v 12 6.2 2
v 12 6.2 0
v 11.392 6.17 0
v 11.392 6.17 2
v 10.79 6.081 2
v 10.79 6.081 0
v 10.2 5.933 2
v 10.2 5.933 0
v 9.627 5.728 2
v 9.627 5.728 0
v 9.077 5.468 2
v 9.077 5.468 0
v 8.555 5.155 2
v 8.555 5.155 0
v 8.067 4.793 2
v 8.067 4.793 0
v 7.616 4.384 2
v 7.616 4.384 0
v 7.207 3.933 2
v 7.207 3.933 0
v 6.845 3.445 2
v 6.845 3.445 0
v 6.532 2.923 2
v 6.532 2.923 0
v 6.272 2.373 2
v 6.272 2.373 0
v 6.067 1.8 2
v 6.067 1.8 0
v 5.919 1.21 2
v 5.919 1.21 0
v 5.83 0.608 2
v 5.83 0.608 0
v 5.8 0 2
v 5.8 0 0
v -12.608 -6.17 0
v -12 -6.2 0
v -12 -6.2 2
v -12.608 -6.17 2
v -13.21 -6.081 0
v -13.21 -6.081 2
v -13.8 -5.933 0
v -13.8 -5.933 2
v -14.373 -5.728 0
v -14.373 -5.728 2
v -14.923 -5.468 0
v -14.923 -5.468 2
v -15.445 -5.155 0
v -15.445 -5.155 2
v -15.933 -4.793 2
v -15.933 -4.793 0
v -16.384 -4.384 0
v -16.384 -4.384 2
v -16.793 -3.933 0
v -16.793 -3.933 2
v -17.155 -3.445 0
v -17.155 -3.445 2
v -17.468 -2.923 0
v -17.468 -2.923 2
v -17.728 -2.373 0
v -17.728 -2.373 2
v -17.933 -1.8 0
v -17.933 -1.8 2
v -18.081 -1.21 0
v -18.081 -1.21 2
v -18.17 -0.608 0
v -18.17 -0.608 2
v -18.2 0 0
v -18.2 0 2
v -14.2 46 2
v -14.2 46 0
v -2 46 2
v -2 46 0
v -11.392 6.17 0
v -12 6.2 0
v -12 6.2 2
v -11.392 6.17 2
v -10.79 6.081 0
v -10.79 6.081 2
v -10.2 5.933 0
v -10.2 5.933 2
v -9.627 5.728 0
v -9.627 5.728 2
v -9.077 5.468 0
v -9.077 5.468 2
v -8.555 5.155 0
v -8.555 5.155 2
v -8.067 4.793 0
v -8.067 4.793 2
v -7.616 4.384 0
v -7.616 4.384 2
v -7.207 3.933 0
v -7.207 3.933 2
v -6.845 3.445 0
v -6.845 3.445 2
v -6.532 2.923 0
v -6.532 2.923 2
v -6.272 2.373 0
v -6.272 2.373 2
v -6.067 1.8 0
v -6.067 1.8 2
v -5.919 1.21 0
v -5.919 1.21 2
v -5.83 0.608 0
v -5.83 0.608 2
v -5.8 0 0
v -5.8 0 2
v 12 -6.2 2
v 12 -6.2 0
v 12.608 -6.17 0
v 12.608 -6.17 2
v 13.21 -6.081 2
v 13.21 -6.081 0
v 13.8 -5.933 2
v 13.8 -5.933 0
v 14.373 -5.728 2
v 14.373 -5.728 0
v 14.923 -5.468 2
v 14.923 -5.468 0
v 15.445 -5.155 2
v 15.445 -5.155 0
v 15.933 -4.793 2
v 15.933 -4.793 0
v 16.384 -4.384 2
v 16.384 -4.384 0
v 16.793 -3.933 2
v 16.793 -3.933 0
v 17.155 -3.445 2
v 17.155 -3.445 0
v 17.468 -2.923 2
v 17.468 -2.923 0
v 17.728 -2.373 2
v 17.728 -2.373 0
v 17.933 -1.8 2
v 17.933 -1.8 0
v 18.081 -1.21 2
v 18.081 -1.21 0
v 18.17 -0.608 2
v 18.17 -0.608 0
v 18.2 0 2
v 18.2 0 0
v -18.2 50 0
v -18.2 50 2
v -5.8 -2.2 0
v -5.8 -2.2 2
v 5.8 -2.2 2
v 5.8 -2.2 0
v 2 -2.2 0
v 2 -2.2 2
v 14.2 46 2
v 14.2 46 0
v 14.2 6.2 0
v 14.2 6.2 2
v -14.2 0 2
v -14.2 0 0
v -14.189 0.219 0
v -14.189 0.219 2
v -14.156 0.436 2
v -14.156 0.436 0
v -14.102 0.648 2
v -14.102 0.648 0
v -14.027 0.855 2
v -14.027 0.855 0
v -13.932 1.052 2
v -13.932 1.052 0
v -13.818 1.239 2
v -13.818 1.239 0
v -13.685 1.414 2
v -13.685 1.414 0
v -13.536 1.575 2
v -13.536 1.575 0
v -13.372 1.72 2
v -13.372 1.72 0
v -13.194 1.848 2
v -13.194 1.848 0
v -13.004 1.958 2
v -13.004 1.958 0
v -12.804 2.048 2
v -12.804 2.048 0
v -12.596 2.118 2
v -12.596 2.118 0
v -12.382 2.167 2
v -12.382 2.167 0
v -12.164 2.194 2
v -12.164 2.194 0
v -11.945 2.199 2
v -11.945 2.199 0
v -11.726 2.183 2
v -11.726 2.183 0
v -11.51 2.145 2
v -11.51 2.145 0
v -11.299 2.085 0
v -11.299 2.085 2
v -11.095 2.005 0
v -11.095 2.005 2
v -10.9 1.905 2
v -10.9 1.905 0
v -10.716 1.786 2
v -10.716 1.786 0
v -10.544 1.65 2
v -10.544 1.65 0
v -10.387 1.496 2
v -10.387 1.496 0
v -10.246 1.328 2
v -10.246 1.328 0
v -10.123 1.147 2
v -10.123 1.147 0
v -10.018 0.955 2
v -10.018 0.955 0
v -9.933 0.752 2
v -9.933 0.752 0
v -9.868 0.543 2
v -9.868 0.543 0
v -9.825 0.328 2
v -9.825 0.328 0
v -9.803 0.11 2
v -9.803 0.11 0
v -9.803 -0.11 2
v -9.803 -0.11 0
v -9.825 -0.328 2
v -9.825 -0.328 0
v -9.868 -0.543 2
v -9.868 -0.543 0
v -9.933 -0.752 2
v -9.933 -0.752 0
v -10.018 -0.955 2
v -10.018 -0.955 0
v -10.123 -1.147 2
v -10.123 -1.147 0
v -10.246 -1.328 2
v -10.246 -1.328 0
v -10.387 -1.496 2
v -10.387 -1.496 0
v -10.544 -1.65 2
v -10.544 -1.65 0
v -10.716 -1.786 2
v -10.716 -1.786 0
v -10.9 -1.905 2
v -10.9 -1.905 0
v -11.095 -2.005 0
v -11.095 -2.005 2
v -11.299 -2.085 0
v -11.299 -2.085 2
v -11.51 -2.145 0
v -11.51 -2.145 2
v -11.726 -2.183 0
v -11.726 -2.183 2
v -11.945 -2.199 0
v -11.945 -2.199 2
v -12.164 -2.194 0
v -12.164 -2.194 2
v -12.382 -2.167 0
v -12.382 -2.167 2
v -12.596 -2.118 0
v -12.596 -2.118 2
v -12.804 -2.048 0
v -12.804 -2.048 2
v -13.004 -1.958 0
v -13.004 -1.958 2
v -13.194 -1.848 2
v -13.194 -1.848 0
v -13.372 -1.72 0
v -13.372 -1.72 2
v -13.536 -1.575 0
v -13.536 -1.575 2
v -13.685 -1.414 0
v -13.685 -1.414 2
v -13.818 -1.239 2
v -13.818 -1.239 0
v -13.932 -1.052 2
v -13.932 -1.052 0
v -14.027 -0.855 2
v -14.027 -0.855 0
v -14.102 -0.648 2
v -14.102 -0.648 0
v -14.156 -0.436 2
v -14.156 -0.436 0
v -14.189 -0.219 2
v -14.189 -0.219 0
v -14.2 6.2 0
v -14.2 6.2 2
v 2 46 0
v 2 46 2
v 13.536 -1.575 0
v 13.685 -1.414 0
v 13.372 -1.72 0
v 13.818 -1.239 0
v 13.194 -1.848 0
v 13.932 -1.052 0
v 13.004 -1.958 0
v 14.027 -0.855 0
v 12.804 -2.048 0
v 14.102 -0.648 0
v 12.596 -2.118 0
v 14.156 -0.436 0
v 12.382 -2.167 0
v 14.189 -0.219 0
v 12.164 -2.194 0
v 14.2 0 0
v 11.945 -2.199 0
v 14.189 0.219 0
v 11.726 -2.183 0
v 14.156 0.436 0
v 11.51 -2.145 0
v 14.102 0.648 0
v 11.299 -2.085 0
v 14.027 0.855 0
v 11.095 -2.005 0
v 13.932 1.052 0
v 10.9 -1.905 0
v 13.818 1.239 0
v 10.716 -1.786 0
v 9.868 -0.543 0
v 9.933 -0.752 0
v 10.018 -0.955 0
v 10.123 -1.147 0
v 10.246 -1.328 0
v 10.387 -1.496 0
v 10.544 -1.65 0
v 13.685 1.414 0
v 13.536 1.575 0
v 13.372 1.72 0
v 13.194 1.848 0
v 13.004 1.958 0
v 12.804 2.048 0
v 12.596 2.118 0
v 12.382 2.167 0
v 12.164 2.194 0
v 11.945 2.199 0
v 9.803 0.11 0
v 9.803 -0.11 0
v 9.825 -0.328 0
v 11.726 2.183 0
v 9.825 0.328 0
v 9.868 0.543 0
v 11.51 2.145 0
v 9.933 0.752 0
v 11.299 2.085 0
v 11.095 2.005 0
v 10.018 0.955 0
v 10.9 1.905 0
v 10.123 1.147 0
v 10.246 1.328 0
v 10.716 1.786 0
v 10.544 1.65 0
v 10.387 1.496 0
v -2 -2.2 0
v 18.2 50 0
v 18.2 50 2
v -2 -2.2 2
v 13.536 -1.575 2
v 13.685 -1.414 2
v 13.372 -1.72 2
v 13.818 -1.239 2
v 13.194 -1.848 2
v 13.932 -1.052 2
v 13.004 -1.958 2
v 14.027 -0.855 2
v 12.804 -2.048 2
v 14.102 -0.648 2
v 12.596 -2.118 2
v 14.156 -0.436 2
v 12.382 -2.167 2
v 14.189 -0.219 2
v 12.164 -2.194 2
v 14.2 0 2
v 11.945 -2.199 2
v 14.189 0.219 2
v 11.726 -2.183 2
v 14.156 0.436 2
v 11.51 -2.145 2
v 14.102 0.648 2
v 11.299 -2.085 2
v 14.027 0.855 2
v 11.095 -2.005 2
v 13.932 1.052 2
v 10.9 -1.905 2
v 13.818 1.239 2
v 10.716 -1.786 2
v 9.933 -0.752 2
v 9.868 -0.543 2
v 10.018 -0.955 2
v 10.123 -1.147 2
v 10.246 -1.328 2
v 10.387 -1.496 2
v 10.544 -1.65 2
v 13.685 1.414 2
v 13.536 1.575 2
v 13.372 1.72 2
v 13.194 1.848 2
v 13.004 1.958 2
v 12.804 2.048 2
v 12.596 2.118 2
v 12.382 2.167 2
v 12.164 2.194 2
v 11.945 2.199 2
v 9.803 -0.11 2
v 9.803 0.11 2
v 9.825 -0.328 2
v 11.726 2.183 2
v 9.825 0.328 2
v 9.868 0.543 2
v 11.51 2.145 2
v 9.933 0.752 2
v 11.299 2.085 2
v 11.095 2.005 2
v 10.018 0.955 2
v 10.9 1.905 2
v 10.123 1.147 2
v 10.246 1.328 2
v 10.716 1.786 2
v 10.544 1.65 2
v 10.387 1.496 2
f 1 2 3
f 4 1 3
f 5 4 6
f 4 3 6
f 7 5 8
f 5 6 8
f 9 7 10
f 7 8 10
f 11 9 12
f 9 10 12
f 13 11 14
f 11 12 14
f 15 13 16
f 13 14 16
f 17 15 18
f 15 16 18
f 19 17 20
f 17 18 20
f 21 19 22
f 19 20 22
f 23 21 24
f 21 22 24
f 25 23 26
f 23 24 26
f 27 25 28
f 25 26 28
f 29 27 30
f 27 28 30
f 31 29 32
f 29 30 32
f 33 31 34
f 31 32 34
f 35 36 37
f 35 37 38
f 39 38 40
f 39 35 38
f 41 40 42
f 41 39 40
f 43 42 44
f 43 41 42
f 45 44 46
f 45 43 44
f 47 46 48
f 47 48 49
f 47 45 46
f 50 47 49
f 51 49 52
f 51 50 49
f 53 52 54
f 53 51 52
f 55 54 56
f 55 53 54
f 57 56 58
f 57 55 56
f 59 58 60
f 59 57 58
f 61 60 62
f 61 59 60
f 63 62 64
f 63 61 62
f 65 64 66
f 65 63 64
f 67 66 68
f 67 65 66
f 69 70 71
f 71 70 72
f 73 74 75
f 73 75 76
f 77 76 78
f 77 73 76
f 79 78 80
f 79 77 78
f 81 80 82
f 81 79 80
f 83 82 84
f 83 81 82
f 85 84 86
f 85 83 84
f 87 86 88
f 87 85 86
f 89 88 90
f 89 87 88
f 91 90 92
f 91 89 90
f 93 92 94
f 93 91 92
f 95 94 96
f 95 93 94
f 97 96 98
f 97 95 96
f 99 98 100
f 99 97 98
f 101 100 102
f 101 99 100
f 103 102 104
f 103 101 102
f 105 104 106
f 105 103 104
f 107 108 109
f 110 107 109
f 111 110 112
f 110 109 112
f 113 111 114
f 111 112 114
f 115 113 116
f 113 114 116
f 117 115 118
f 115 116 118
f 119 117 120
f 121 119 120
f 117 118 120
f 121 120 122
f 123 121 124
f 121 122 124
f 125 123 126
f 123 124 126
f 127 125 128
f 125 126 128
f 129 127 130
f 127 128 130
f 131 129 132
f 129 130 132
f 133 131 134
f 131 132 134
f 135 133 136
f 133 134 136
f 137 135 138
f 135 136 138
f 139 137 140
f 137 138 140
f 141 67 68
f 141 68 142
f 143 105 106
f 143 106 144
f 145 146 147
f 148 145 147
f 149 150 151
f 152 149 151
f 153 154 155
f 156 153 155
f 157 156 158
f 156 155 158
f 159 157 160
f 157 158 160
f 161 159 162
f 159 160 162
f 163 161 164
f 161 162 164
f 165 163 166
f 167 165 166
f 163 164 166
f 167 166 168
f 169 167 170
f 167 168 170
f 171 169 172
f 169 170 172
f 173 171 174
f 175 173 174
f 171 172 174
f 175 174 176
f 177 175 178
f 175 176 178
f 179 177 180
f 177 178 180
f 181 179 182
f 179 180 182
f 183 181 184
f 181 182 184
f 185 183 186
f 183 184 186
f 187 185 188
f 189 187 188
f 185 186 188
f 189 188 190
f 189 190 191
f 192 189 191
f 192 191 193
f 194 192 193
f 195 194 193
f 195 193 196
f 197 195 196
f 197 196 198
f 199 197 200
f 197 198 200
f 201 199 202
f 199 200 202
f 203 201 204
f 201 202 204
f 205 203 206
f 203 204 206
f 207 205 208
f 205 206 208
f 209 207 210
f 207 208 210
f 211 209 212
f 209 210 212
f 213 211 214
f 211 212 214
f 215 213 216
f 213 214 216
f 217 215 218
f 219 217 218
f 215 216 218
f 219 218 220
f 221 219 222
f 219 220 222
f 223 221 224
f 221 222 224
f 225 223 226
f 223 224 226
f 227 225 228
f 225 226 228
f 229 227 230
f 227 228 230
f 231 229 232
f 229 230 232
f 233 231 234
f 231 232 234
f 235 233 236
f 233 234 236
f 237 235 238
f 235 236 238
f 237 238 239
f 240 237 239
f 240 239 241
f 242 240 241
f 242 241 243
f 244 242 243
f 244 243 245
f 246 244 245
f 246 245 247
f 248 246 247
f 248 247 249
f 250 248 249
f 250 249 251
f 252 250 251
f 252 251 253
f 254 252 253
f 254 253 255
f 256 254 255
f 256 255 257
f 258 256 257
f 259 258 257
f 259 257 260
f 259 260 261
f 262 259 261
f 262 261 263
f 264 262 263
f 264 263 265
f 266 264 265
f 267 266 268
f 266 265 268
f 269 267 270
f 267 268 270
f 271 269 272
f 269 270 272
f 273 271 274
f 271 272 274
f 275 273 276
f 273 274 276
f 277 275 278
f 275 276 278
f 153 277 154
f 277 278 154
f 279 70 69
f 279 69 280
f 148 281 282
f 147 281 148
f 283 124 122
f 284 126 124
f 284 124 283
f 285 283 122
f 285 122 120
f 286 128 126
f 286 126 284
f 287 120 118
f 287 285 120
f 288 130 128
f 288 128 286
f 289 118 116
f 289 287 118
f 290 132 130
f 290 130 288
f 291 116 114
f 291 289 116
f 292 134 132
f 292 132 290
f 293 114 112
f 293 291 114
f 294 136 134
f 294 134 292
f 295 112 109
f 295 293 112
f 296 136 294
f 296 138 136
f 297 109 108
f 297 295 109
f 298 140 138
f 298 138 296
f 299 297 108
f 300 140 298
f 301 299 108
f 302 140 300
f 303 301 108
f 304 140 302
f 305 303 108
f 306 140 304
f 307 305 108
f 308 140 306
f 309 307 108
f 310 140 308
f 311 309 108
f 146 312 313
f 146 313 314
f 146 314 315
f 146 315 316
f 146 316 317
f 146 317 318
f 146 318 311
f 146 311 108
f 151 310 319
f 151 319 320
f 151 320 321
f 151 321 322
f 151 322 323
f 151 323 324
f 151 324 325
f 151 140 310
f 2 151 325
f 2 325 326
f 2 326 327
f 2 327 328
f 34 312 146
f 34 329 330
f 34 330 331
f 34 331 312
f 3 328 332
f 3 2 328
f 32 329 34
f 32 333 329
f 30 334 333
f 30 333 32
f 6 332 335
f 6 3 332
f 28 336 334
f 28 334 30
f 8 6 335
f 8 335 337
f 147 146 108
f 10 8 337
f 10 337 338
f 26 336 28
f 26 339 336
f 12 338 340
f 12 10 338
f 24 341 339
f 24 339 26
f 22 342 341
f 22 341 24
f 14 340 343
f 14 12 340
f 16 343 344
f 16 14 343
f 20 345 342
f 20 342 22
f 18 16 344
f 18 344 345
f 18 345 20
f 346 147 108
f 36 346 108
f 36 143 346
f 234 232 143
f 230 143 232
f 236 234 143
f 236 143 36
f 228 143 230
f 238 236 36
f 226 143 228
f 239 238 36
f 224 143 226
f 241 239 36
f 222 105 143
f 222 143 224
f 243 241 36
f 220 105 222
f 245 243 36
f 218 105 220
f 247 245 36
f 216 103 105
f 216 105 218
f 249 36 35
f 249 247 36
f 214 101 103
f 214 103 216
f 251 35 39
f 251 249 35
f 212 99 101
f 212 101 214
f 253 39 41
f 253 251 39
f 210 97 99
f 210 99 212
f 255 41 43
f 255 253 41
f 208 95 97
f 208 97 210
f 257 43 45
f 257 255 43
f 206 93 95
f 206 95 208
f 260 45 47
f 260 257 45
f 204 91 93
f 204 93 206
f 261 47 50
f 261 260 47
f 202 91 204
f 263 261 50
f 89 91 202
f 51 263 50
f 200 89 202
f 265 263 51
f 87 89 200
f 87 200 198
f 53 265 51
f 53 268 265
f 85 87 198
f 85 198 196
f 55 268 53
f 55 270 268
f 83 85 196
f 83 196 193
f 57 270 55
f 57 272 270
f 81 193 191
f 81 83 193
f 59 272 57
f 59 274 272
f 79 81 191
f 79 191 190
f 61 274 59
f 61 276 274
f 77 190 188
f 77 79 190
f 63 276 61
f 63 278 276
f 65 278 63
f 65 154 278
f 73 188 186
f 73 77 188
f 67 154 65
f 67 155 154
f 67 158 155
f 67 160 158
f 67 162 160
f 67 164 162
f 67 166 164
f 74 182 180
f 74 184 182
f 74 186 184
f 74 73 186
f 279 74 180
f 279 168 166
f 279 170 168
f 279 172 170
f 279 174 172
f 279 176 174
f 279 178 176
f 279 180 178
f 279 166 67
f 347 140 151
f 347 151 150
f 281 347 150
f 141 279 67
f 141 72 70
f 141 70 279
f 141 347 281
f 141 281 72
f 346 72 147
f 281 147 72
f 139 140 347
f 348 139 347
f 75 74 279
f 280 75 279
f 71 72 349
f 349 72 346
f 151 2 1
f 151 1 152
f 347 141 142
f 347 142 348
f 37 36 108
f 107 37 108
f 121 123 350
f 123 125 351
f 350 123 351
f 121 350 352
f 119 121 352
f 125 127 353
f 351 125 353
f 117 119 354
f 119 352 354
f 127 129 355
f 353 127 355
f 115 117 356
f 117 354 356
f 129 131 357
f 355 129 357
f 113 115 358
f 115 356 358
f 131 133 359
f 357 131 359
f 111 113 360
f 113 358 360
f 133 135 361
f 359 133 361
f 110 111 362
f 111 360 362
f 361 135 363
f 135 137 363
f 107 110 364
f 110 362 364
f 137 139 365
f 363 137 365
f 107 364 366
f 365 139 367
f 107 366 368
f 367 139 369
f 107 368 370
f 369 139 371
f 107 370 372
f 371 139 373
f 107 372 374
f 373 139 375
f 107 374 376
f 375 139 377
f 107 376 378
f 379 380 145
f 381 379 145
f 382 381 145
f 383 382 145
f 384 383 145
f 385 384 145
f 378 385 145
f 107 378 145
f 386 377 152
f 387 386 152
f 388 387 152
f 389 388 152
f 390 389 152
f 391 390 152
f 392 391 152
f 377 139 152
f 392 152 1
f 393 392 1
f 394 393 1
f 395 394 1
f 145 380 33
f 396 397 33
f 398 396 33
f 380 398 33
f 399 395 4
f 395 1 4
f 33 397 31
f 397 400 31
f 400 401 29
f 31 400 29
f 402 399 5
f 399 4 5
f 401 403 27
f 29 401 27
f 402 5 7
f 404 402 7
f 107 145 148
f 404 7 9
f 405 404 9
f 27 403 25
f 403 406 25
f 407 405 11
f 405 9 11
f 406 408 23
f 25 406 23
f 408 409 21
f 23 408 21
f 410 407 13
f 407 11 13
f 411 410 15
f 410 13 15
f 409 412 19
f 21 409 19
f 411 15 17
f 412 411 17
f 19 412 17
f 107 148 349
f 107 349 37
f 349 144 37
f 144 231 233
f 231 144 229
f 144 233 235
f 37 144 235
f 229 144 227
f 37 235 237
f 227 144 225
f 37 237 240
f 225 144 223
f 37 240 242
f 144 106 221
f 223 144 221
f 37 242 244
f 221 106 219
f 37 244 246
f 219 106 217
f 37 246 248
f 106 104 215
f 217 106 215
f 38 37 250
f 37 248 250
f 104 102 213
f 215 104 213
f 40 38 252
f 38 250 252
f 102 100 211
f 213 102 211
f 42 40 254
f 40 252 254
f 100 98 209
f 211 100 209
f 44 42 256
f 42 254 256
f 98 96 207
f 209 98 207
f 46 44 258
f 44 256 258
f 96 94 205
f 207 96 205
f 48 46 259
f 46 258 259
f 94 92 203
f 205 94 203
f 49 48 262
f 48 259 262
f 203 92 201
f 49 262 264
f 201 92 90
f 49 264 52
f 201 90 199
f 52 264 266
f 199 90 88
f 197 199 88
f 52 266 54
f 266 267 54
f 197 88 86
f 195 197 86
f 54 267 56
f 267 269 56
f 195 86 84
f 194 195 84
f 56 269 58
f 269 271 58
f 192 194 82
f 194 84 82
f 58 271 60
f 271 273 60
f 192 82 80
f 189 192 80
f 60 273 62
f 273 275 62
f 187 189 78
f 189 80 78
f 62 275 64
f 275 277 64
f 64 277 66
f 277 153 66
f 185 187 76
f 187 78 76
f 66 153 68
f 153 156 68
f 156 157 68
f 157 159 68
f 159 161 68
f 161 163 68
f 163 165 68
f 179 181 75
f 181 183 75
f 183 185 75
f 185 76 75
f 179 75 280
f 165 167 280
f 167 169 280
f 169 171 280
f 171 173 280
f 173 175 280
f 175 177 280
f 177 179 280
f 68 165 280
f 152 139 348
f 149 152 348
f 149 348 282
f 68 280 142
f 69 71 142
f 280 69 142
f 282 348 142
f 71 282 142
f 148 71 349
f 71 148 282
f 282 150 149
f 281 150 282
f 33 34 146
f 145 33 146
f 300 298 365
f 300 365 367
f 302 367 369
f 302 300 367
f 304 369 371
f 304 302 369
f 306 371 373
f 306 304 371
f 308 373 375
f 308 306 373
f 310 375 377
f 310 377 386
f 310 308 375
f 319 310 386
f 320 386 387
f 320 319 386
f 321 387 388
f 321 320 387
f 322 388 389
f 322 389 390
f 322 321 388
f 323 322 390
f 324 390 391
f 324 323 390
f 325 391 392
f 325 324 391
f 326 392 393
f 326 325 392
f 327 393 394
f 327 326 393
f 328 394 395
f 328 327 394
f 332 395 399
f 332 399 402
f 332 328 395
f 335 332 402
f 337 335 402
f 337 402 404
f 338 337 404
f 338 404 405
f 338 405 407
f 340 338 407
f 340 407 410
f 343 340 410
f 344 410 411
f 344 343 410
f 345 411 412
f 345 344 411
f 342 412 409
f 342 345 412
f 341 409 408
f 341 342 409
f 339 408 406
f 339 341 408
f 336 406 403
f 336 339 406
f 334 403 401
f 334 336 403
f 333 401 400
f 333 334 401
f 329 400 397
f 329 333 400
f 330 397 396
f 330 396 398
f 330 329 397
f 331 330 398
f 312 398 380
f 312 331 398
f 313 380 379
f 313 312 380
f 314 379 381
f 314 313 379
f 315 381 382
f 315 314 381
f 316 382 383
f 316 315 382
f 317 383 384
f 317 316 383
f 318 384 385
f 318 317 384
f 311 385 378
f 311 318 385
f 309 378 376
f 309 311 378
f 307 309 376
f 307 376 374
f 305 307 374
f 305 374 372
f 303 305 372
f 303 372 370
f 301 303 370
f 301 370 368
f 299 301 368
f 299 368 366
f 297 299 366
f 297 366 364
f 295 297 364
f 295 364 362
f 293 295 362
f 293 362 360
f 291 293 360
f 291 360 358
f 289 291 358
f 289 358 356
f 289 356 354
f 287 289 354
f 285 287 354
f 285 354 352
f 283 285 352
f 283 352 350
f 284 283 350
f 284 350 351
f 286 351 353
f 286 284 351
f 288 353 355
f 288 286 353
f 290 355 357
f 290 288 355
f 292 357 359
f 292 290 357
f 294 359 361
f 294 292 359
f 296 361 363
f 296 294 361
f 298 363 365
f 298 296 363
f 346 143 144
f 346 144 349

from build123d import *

# Parameters (mm, degrees)
SKETCH_R  = 2.2
PAD_DEPTH = 2


with BuildPart() as part:
    # Sketch → Pad (new body)
    with BuildSketch(Plane.XY):
        with BuildLine():
            ThreePointArc((12, -6.2), (16.384062, -4.384062), (18.2, 0))
            Line((18.2, 0), (18.2, 50))
            Line((18.2, 50), (0, 50))
            Line((0, -6.2), (0, 50))
            Line((12, -6.2), (0, -6.2))
        make_face()
        with Locations((12, 0)):
            Circle(SKETCH_R, mode=Mode.SUBTRACT)
        with BuildLine():
            ThreePointArc((12, 6.2), (7.615938, 4.384062), (5.8, 0))
            Line((5.8, 0), (5.8, -2.2))
            Line((5.8, -2.2), (2, -2.2))
            Line((2, 46), (2, -2.2))
            Line((14.2, 46), (2, 46))
            Line((14.2, 46), (14.2, 6.2))
            Line((12, 6.2), (14.2, 6.2))
        make_face(mode=Mode.SUBTRACT)
    pad = extrude(amount=PAD_DEPTH)

    # Mirrored: Pad across Sketch V_Axis
    add(pad.mirror(Plane(origin=(0, 0, 0), x_dir=(0, 0, 1), z_dir=(1, 0, 0))))


solid = part.part
